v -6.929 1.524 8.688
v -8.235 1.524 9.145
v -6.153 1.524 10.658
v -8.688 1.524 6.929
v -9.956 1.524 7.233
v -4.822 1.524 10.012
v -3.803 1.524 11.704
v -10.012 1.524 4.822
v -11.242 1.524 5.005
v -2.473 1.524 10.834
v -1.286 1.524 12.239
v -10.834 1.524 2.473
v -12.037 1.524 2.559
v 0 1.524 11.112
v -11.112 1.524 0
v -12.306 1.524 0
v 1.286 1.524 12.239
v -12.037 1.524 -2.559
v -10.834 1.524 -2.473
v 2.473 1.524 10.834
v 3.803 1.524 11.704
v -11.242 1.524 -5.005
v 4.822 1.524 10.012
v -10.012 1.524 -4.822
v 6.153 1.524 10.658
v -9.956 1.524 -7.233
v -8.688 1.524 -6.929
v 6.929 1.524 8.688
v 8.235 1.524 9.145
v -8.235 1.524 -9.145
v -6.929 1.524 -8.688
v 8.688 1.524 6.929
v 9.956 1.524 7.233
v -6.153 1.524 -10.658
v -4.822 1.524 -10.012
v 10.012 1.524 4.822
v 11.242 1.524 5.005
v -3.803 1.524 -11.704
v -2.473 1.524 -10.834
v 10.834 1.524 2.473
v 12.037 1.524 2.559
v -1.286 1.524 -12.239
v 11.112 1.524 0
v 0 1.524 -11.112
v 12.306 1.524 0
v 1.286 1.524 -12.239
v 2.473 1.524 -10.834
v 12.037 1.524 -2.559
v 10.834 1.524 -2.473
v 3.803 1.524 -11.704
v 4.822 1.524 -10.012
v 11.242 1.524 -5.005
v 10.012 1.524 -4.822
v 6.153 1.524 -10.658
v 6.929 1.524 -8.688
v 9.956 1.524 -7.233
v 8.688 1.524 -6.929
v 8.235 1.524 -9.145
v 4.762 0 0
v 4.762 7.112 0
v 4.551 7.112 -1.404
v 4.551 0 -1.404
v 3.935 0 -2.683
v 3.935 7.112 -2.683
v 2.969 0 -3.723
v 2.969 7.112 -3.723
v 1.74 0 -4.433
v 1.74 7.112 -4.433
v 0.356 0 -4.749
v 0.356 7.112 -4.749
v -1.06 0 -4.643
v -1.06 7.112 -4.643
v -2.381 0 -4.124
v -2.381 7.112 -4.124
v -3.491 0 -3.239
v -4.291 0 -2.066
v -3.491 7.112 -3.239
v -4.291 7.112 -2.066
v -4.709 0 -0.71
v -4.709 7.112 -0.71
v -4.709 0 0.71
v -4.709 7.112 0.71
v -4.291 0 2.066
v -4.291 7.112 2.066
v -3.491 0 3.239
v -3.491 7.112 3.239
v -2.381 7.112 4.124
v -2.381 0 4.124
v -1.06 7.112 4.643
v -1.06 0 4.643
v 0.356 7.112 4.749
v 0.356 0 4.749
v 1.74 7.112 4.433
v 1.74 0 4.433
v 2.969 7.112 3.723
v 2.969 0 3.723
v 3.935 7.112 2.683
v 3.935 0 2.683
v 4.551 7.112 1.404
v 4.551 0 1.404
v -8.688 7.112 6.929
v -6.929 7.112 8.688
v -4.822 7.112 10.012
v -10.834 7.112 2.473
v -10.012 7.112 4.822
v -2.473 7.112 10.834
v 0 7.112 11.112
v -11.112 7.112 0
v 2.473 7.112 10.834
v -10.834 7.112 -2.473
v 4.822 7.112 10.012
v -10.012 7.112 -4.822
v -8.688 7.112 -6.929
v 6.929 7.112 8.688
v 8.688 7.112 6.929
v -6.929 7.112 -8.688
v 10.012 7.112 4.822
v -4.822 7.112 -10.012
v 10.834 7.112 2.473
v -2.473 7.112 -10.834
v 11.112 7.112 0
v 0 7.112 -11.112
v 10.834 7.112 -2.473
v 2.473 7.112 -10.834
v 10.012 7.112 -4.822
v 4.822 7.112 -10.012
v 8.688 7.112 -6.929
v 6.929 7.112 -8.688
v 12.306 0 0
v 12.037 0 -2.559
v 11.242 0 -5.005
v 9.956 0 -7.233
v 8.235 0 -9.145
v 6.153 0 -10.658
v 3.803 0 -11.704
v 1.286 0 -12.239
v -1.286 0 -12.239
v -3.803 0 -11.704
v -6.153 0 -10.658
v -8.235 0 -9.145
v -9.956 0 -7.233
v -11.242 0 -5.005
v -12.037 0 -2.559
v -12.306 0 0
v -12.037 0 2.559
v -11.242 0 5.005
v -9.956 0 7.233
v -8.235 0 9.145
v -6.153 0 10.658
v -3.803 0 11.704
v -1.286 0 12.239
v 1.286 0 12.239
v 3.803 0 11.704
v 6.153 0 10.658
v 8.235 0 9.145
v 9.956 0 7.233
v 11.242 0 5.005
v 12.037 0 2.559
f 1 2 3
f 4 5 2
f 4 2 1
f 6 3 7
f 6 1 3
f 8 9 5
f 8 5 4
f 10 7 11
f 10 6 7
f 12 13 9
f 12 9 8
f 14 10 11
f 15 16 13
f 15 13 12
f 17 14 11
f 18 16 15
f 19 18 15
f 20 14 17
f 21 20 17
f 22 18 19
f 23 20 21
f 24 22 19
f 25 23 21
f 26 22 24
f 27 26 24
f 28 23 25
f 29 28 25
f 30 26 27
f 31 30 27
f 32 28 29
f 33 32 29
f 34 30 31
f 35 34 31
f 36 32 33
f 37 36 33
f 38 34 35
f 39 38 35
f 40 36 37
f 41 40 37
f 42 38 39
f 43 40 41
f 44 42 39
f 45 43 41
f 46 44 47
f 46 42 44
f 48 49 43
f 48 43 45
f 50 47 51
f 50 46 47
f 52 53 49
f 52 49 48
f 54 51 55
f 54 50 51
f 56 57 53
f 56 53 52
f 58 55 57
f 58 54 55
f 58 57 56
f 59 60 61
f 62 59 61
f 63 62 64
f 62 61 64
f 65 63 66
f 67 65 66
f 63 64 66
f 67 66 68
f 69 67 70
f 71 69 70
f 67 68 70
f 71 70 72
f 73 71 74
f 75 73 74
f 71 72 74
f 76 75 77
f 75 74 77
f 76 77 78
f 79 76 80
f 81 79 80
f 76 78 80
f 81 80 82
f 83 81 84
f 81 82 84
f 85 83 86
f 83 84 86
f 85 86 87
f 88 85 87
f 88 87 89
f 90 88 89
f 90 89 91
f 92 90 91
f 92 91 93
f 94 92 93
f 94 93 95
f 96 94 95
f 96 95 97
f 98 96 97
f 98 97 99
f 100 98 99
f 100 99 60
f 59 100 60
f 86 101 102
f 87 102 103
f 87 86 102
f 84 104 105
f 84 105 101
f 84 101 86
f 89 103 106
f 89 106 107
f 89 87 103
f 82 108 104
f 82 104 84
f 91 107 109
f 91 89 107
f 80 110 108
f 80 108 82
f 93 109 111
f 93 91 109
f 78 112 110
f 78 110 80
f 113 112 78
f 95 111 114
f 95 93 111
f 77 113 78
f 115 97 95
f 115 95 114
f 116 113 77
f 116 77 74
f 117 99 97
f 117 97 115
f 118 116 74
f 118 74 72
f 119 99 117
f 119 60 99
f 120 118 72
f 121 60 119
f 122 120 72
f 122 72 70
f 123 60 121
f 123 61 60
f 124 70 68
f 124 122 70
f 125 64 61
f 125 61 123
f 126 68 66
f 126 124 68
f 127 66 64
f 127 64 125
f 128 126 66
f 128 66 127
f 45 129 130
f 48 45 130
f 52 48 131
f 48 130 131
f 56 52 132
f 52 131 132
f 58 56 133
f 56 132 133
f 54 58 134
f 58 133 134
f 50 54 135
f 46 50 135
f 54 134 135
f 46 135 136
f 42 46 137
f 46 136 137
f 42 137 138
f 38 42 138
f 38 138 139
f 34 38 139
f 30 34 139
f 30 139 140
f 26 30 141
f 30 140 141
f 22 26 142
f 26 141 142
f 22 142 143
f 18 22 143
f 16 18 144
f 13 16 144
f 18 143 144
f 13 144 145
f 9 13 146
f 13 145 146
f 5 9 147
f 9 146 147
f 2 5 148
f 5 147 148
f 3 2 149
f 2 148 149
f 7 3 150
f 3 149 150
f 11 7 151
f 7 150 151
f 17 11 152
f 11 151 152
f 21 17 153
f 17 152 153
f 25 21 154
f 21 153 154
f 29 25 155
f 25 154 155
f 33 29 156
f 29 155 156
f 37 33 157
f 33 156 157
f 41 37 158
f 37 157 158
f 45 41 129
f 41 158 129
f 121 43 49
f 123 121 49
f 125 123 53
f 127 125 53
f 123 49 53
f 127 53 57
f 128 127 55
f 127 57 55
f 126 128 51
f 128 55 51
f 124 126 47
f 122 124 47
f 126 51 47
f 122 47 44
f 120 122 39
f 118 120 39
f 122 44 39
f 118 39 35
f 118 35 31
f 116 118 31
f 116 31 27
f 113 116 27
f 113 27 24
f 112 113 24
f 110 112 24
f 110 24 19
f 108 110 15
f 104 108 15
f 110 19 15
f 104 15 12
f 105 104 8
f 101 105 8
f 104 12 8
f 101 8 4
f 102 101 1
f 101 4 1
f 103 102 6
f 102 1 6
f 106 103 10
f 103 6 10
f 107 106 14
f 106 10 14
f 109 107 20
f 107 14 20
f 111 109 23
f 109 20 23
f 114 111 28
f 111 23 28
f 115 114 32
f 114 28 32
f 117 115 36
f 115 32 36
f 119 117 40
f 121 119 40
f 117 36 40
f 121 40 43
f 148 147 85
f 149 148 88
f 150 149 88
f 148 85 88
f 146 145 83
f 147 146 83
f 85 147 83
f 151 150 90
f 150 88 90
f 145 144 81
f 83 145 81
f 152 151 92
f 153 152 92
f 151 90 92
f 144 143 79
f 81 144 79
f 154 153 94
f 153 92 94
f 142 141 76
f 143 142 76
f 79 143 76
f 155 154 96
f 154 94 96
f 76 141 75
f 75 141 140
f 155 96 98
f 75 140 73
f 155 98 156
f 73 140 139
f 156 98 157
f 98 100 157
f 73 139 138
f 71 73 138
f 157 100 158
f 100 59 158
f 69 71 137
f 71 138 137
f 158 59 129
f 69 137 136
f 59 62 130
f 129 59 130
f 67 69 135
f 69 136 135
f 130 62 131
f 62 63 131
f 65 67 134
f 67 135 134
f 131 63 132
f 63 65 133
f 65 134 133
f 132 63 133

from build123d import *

# Parameters (mm, degrees)
SKETCH_1_R          = 12.3063
EXTRUDE_1_DEPTH     = 1.524
SKETCH_2_R          = 11.1125
EXTRUDE_2_DEPTH     = 5.588
SKETCH_3_R          = 4.7625
CUT_EXTRUDE_1_DEPTH = 8.112


with BuildPart() as part:
    # 草圖1 → 填料-伸長1 (new body)
    with BuildSketch(Plane(origin=(0, 0, 0), x_dir=(1, 0, 0), z_dir=(0, 1, 0))):
        Circle(SKETCH_1_R)
    extrude(amount=EXTRUDE_1_DEPTH)

    # 草圖2 → 填料-伸長2 (add)
    with BuildSketch(Plane(origin=(0, 1.524, 0), x_dir=(1, 0, 0), z_dir=(0, 1, 0))):
        Circle(SKETCH_2_R)
    extrude(amount=EXTRUDE_2_DEPTH)

    # 草圖3 → 除料-伸長1 (cut, through all)
    with BuildSketch(Plane(origin=(0, 7.112, 0), x_dir=(1, 0, 0), z_dir=(0, 1, 0))):
        Circle(SKETCH_3_R)
    extrude(amount=-CUT_EXTRUDE_1_DEPTH, mode=Mode.SUBTRACT)


solid = part.part
